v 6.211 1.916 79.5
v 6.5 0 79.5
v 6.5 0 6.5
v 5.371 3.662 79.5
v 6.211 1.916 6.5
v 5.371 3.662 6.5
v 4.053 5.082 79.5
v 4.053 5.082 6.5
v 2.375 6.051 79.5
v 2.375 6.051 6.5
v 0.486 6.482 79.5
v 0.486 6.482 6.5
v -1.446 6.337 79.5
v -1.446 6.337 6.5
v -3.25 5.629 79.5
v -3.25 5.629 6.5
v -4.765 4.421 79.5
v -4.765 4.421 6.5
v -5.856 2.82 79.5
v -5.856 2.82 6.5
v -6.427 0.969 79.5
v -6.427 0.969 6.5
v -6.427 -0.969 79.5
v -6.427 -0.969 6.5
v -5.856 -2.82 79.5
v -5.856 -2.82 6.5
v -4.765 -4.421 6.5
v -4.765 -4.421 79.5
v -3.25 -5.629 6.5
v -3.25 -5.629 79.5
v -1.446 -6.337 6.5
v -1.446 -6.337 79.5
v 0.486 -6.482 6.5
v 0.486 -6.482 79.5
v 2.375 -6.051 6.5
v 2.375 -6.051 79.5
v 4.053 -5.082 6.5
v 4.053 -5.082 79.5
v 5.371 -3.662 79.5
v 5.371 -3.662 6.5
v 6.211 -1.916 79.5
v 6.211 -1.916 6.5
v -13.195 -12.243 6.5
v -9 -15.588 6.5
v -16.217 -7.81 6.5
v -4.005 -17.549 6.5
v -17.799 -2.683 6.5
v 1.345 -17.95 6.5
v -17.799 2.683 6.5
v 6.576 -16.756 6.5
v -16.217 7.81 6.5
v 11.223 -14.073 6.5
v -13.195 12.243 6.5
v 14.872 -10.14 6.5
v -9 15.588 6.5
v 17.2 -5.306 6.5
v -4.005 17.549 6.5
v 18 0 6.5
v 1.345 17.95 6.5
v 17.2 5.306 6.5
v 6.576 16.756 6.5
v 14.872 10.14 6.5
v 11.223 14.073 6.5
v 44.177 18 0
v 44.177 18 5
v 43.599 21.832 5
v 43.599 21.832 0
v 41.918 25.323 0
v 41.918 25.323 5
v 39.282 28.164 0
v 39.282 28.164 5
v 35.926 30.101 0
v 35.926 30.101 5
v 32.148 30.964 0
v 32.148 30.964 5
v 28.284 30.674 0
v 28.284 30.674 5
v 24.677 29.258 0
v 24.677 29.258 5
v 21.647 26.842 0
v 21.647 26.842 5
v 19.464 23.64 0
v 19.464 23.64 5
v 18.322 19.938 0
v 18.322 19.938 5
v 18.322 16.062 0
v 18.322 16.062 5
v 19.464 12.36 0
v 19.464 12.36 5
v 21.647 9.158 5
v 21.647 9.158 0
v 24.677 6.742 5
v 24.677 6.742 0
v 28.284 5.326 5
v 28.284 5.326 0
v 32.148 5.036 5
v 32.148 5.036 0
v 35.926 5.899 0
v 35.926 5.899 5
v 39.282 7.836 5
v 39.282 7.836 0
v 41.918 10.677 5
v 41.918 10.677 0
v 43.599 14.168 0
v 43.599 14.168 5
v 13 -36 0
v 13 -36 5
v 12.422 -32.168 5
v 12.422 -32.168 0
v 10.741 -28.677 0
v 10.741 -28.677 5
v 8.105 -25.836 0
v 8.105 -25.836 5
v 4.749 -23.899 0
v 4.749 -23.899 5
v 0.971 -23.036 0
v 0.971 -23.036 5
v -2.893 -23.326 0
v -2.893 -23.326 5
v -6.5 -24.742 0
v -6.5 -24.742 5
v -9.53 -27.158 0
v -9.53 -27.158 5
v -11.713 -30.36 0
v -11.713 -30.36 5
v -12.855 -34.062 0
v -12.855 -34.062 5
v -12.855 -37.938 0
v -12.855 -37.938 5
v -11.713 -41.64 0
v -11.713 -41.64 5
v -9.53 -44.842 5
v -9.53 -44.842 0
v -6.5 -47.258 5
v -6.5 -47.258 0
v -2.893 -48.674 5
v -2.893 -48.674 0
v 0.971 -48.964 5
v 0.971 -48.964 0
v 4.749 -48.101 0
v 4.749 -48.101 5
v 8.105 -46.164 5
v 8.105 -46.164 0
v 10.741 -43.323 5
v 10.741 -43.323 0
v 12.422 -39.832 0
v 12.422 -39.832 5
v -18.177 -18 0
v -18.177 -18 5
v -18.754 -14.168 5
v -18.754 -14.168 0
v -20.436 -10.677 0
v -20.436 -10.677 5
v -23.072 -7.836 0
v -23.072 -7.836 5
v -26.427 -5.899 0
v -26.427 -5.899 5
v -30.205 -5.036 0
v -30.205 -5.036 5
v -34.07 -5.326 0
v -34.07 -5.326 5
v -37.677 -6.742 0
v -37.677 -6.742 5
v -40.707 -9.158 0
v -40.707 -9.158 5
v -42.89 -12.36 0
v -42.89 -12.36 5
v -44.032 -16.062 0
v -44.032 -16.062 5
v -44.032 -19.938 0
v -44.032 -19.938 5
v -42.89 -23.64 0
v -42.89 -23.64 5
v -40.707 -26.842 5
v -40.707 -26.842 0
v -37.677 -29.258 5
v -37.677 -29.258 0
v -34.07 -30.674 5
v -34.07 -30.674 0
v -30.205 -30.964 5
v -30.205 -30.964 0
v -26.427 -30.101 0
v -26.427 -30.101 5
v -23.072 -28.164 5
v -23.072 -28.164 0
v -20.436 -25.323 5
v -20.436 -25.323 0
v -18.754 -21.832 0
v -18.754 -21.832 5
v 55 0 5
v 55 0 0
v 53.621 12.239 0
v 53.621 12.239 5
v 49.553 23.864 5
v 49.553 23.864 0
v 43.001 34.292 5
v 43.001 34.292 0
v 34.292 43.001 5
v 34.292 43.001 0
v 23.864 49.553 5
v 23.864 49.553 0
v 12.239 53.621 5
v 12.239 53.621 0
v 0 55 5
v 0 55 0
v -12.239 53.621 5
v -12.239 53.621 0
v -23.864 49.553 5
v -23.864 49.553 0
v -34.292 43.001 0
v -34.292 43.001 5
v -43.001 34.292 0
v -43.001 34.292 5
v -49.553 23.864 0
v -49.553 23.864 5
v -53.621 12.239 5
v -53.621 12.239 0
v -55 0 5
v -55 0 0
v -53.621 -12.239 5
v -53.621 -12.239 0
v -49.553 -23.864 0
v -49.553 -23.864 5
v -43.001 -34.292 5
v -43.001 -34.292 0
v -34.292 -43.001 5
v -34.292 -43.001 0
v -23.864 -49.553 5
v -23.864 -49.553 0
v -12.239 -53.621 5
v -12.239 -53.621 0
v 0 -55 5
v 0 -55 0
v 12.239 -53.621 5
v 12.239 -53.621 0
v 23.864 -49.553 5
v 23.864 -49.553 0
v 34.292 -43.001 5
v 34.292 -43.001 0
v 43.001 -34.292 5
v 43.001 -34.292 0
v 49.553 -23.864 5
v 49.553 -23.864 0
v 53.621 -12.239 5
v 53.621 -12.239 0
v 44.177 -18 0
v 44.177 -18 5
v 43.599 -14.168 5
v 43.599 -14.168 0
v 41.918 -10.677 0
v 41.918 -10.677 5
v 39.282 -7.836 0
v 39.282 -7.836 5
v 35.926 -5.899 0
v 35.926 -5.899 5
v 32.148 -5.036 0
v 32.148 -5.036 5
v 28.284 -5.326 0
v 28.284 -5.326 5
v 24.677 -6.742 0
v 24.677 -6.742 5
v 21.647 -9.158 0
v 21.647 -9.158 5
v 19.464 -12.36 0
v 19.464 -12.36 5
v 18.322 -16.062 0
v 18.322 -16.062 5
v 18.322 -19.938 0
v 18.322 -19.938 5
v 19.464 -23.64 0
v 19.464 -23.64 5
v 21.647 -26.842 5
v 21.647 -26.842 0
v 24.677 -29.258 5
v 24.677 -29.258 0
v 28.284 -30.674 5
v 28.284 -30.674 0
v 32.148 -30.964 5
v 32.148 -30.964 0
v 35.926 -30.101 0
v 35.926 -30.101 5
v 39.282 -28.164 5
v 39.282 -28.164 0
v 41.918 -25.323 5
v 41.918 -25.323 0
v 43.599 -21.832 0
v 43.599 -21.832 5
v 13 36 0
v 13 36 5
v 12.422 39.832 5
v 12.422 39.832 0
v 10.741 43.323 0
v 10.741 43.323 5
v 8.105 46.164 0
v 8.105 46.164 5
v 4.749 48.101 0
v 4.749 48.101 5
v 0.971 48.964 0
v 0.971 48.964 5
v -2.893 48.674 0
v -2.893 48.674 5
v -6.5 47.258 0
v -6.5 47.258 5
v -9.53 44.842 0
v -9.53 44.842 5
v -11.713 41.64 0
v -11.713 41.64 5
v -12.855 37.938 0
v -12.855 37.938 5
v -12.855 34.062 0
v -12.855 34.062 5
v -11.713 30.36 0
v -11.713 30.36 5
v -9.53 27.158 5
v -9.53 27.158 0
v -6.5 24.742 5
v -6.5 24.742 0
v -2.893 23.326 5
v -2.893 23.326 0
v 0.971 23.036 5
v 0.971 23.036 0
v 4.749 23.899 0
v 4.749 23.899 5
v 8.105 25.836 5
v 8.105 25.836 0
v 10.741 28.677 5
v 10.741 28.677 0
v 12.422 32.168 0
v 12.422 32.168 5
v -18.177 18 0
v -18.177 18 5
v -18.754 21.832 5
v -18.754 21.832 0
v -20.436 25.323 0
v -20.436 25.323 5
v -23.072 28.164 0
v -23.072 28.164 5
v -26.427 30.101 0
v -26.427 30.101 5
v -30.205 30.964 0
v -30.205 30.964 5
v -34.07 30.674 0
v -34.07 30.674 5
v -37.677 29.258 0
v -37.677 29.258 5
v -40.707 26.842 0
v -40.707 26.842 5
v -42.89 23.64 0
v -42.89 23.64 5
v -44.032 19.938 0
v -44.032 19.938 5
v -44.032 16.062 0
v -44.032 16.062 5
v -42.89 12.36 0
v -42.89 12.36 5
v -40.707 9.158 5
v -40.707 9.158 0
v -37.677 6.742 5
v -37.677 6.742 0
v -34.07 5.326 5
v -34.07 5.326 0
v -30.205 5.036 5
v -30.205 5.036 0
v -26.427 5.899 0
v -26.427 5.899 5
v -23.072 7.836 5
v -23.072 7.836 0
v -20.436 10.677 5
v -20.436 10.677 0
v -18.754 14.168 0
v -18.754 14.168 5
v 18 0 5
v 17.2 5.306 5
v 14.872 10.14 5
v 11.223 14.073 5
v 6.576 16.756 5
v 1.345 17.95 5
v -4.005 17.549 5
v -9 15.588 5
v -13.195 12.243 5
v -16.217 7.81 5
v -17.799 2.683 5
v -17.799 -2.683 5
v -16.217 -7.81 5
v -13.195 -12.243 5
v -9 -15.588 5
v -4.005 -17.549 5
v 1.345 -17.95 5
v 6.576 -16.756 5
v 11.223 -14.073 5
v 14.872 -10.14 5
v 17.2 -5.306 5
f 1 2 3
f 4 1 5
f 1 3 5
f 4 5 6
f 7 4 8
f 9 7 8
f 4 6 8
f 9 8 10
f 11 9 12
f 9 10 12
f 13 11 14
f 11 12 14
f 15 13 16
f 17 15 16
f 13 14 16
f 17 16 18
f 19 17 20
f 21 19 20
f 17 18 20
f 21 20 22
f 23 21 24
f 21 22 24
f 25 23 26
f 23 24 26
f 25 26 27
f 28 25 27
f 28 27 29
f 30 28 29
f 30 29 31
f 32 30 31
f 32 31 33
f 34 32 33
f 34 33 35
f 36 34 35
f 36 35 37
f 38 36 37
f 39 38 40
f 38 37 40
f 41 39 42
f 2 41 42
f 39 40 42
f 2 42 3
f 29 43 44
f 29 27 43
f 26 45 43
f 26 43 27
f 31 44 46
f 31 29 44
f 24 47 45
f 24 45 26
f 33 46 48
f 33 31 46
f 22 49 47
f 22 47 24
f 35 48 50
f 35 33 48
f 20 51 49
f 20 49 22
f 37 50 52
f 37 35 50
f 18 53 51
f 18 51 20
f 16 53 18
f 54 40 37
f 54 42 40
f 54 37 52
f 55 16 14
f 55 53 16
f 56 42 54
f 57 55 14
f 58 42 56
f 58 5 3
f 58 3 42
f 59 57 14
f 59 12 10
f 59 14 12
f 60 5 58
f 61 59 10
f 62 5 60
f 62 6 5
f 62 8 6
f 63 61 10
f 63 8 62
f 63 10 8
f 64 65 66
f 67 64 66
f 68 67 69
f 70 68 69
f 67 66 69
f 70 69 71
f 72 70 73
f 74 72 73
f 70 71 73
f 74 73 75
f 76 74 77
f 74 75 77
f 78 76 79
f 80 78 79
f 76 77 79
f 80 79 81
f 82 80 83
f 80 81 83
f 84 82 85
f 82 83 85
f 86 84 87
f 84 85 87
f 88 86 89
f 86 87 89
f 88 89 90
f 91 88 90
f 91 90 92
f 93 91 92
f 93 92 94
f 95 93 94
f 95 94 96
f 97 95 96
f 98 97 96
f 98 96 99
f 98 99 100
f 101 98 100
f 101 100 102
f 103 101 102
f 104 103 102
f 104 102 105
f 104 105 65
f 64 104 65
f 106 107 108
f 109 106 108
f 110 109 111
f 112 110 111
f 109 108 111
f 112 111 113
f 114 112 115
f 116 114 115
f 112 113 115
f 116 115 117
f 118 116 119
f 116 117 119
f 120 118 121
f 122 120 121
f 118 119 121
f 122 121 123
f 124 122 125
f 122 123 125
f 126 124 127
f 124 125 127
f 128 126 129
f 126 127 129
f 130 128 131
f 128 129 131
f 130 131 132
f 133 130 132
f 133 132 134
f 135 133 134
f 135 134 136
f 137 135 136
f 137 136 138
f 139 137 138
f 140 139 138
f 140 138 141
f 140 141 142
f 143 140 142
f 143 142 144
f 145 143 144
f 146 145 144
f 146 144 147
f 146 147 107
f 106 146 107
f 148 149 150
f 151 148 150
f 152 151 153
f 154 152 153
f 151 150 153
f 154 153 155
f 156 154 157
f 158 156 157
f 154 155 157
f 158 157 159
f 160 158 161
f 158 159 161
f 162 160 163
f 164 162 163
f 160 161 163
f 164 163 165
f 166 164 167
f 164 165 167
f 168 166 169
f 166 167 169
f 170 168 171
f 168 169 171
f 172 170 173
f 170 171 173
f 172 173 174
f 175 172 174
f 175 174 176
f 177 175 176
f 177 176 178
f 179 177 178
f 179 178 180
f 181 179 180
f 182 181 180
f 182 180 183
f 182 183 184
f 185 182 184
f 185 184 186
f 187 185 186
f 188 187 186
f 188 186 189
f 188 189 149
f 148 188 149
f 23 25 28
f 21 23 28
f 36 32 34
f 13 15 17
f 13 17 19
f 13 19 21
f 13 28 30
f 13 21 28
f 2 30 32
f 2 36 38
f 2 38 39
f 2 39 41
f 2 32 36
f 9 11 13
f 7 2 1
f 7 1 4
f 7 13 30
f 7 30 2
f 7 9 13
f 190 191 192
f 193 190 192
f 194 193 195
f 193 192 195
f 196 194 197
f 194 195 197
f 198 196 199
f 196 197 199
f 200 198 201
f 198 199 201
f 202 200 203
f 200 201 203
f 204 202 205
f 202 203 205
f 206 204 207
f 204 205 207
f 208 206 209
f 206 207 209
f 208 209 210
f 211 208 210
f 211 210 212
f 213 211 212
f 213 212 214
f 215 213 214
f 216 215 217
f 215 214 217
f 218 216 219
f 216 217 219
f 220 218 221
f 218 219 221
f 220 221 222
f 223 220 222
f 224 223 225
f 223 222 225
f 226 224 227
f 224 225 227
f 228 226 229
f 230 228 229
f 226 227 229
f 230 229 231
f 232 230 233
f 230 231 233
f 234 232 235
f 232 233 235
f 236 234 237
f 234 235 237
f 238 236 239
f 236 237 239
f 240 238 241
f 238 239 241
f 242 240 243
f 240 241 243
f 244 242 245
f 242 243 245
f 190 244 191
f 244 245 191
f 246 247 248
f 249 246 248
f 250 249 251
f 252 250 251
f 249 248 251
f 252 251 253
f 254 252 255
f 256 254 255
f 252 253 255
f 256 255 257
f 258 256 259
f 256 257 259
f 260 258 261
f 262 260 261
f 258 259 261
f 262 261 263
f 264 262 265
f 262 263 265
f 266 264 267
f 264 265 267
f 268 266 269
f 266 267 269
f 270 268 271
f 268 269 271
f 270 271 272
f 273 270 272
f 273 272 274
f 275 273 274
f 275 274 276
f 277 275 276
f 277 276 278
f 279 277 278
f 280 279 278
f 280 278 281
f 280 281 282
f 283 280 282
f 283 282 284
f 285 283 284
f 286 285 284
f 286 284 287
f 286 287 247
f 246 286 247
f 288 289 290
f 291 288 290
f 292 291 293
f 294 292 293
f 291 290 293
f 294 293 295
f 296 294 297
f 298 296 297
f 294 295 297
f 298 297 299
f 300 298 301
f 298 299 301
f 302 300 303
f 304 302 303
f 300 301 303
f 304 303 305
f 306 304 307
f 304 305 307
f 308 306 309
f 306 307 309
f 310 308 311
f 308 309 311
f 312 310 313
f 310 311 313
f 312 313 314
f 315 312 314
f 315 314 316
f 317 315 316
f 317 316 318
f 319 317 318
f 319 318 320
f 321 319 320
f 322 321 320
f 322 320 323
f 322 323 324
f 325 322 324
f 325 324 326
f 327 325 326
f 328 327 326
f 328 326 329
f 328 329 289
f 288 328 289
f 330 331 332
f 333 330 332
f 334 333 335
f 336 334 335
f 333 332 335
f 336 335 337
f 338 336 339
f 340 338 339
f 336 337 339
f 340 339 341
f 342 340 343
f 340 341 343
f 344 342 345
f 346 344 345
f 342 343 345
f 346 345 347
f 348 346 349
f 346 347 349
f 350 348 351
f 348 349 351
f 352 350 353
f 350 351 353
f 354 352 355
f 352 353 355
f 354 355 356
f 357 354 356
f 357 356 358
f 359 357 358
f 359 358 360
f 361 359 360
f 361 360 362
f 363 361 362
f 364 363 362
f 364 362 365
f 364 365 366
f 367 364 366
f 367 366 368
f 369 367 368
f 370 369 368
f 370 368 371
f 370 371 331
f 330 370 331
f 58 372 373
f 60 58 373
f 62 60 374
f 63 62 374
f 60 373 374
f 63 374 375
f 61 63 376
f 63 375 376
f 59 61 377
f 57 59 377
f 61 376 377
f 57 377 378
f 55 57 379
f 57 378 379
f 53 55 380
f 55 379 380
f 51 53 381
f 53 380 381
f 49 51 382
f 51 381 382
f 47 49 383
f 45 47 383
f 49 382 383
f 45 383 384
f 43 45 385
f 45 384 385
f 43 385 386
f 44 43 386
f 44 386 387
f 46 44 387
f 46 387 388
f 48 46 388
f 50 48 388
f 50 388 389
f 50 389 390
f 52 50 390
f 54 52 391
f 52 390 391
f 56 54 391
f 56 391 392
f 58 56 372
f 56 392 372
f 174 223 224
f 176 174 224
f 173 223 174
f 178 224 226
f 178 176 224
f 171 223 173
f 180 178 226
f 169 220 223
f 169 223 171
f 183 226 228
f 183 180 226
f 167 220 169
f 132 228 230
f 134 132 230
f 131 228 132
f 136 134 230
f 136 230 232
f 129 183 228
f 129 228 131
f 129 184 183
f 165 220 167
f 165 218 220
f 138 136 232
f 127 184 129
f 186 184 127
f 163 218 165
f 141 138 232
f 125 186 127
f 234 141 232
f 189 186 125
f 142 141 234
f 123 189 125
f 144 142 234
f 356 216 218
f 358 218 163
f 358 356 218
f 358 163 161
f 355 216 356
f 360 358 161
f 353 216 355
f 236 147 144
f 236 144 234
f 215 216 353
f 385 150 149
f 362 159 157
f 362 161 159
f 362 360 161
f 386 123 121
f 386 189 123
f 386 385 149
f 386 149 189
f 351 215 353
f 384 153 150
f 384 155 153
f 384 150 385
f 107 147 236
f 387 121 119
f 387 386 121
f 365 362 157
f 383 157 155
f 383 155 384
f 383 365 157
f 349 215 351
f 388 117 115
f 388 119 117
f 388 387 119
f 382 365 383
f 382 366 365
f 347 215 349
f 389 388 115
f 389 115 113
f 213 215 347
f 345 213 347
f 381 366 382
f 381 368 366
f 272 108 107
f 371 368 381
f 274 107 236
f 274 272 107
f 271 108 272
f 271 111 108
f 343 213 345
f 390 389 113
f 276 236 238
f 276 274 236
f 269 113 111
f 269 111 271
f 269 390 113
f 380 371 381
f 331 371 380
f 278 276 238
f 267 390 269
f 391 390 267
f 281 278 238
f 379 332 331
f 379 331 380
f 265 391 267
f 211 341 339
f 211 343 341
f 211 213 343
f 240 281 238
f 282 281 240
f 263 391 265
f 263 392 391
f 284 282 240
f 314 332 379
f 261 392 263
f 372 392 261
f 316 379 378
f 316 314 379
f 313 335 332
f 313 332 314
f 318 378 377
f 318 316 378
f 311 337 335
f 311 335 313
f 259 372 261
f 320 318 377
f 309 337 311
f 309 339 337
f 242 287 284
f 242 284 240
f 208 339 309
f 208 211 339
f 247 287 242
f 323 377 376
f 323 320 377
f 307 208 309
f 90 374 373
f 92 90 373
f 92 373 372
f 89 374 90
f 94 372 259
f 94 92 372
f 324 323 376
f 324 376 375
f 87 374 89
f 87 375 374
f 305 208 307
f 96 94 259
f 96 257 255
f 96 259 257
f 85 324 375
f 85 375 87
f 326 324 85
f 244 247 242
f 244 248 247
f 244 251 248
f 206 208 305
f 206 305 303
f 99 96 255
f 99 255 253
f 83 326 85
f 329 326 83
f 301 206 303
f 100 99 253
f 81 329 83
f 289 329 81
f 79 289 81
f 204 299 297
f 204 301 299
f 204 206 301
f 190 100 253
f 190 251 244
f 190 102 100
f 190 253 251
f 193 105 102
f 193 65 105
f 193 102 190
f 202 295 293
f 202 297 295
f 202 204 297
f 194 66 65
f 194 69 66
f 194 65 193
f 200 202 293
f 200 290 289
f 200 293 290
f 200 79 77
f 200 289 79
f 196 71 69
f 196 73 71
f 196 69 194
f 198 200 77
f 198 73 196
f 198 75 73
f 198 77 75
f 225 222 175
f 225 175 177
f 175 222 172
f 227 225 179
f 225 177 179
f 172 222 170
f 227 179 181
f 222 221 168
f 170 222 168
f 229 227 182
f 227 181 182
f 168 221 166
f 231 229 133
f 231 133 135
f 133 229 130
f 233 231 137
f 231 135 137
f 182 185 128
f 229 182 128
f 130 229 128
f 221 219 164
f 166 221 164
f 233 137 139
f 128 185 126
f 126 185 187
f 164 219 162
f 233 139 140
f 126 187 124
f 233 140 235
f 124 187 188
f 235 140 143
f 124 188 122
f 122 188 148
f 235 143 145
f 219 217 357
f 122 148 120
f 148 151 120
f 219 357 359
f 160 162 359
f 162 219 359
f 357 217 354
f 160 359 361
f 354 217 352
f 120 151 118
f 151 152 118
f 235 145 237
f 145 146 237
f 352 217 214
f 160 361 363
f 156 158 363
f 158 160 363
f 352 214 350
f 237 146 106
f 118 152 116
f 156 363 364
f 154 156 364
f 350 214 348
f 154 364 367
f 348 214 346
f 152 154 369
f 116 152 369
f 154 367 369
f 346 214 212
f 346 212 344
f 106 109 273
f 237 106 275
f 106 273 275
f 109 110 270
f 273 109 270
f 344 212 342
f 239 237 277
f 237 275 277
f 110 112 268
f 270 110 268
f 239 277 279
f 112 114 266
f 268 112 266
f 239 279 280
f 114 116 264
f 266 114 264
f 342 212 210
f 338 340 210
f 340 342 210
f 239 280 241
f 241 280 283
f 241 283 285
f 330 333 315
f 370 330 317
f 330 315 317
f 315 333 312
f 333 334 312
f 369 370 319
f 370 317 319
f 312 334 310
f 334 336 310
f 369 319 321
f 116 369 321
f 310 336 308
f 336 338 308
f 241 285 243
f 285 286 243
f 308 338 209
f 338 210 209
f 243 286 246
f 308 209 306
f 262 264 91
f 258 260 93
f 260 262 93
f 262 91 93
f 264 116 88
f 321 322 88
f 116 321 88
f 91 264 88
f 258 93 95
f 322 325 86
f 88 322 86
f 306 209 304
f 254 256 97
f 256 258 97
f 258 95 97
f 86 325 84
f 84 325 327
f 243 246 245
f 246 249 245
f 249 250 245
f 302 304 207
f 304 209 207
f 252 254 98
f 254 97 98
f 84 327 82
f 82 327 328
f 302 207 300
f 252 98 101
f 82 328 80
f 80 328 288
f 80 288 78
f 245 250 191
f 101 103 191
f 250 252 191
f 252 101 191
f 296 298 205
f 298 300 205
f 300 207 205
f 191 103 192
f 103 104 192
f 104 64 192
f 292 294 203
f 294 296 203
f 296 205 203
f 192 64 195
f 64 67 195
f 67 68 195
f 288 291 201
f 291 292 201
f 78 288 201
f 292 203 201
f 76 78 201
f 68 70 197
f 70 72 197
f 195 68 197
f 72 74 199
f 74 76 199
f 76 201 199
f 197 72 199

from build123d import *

# Parameters (mm, degrees)
F0_R     = 55
F1_DEPTH = 5
F2_R     = 18
F3_DEPTH = 1.5
F4_R     = 6.5
F5_DEPTH = 73
F6_R     = 13
F7_DEPTH = 5.001


with BuildPart() as f1:
    # F0 (on Top) → F1 (new body)
    with BuildSketch(Plane.XY):
        Circle(F0_R)
    extrude(amount=F1_DEPTH)

    # F2 (on face) → F3 (join)
    with BuildSketch(Plane.XY.offset(5)):
        Circle(F2_R)
    extrude(amount=F3_DEPTH)

    # F4 (on face) → F5 (join)
    with BuildSketch(Plane.XY.offset(6.5)):
        Circle(F4_R)
    extrude(amount=F5_DEPTH)

    # F6 (on face) → F7 (cut, through all)
    with BuildSketch(Plane.XY.offset(5)):
        with Locations((0, 36)):
            Circle(F6_R)
        with Locations((-31.176915, 18)):
            Circle(F6_R)
        with Locations((-31.176915, -18)):
            Circle(F6_R)
        with Locations((0, -36)):
            Circle(F6_R)
        with Locations((31.176915, -18)):
            Circle(F6_R)
        with Locations((31.176915, 18)):
            Circle(F6_R)
    extrude(amount=-F7_DEPTH, mode=Mode.SUBTRACT)


solid = f1.part
